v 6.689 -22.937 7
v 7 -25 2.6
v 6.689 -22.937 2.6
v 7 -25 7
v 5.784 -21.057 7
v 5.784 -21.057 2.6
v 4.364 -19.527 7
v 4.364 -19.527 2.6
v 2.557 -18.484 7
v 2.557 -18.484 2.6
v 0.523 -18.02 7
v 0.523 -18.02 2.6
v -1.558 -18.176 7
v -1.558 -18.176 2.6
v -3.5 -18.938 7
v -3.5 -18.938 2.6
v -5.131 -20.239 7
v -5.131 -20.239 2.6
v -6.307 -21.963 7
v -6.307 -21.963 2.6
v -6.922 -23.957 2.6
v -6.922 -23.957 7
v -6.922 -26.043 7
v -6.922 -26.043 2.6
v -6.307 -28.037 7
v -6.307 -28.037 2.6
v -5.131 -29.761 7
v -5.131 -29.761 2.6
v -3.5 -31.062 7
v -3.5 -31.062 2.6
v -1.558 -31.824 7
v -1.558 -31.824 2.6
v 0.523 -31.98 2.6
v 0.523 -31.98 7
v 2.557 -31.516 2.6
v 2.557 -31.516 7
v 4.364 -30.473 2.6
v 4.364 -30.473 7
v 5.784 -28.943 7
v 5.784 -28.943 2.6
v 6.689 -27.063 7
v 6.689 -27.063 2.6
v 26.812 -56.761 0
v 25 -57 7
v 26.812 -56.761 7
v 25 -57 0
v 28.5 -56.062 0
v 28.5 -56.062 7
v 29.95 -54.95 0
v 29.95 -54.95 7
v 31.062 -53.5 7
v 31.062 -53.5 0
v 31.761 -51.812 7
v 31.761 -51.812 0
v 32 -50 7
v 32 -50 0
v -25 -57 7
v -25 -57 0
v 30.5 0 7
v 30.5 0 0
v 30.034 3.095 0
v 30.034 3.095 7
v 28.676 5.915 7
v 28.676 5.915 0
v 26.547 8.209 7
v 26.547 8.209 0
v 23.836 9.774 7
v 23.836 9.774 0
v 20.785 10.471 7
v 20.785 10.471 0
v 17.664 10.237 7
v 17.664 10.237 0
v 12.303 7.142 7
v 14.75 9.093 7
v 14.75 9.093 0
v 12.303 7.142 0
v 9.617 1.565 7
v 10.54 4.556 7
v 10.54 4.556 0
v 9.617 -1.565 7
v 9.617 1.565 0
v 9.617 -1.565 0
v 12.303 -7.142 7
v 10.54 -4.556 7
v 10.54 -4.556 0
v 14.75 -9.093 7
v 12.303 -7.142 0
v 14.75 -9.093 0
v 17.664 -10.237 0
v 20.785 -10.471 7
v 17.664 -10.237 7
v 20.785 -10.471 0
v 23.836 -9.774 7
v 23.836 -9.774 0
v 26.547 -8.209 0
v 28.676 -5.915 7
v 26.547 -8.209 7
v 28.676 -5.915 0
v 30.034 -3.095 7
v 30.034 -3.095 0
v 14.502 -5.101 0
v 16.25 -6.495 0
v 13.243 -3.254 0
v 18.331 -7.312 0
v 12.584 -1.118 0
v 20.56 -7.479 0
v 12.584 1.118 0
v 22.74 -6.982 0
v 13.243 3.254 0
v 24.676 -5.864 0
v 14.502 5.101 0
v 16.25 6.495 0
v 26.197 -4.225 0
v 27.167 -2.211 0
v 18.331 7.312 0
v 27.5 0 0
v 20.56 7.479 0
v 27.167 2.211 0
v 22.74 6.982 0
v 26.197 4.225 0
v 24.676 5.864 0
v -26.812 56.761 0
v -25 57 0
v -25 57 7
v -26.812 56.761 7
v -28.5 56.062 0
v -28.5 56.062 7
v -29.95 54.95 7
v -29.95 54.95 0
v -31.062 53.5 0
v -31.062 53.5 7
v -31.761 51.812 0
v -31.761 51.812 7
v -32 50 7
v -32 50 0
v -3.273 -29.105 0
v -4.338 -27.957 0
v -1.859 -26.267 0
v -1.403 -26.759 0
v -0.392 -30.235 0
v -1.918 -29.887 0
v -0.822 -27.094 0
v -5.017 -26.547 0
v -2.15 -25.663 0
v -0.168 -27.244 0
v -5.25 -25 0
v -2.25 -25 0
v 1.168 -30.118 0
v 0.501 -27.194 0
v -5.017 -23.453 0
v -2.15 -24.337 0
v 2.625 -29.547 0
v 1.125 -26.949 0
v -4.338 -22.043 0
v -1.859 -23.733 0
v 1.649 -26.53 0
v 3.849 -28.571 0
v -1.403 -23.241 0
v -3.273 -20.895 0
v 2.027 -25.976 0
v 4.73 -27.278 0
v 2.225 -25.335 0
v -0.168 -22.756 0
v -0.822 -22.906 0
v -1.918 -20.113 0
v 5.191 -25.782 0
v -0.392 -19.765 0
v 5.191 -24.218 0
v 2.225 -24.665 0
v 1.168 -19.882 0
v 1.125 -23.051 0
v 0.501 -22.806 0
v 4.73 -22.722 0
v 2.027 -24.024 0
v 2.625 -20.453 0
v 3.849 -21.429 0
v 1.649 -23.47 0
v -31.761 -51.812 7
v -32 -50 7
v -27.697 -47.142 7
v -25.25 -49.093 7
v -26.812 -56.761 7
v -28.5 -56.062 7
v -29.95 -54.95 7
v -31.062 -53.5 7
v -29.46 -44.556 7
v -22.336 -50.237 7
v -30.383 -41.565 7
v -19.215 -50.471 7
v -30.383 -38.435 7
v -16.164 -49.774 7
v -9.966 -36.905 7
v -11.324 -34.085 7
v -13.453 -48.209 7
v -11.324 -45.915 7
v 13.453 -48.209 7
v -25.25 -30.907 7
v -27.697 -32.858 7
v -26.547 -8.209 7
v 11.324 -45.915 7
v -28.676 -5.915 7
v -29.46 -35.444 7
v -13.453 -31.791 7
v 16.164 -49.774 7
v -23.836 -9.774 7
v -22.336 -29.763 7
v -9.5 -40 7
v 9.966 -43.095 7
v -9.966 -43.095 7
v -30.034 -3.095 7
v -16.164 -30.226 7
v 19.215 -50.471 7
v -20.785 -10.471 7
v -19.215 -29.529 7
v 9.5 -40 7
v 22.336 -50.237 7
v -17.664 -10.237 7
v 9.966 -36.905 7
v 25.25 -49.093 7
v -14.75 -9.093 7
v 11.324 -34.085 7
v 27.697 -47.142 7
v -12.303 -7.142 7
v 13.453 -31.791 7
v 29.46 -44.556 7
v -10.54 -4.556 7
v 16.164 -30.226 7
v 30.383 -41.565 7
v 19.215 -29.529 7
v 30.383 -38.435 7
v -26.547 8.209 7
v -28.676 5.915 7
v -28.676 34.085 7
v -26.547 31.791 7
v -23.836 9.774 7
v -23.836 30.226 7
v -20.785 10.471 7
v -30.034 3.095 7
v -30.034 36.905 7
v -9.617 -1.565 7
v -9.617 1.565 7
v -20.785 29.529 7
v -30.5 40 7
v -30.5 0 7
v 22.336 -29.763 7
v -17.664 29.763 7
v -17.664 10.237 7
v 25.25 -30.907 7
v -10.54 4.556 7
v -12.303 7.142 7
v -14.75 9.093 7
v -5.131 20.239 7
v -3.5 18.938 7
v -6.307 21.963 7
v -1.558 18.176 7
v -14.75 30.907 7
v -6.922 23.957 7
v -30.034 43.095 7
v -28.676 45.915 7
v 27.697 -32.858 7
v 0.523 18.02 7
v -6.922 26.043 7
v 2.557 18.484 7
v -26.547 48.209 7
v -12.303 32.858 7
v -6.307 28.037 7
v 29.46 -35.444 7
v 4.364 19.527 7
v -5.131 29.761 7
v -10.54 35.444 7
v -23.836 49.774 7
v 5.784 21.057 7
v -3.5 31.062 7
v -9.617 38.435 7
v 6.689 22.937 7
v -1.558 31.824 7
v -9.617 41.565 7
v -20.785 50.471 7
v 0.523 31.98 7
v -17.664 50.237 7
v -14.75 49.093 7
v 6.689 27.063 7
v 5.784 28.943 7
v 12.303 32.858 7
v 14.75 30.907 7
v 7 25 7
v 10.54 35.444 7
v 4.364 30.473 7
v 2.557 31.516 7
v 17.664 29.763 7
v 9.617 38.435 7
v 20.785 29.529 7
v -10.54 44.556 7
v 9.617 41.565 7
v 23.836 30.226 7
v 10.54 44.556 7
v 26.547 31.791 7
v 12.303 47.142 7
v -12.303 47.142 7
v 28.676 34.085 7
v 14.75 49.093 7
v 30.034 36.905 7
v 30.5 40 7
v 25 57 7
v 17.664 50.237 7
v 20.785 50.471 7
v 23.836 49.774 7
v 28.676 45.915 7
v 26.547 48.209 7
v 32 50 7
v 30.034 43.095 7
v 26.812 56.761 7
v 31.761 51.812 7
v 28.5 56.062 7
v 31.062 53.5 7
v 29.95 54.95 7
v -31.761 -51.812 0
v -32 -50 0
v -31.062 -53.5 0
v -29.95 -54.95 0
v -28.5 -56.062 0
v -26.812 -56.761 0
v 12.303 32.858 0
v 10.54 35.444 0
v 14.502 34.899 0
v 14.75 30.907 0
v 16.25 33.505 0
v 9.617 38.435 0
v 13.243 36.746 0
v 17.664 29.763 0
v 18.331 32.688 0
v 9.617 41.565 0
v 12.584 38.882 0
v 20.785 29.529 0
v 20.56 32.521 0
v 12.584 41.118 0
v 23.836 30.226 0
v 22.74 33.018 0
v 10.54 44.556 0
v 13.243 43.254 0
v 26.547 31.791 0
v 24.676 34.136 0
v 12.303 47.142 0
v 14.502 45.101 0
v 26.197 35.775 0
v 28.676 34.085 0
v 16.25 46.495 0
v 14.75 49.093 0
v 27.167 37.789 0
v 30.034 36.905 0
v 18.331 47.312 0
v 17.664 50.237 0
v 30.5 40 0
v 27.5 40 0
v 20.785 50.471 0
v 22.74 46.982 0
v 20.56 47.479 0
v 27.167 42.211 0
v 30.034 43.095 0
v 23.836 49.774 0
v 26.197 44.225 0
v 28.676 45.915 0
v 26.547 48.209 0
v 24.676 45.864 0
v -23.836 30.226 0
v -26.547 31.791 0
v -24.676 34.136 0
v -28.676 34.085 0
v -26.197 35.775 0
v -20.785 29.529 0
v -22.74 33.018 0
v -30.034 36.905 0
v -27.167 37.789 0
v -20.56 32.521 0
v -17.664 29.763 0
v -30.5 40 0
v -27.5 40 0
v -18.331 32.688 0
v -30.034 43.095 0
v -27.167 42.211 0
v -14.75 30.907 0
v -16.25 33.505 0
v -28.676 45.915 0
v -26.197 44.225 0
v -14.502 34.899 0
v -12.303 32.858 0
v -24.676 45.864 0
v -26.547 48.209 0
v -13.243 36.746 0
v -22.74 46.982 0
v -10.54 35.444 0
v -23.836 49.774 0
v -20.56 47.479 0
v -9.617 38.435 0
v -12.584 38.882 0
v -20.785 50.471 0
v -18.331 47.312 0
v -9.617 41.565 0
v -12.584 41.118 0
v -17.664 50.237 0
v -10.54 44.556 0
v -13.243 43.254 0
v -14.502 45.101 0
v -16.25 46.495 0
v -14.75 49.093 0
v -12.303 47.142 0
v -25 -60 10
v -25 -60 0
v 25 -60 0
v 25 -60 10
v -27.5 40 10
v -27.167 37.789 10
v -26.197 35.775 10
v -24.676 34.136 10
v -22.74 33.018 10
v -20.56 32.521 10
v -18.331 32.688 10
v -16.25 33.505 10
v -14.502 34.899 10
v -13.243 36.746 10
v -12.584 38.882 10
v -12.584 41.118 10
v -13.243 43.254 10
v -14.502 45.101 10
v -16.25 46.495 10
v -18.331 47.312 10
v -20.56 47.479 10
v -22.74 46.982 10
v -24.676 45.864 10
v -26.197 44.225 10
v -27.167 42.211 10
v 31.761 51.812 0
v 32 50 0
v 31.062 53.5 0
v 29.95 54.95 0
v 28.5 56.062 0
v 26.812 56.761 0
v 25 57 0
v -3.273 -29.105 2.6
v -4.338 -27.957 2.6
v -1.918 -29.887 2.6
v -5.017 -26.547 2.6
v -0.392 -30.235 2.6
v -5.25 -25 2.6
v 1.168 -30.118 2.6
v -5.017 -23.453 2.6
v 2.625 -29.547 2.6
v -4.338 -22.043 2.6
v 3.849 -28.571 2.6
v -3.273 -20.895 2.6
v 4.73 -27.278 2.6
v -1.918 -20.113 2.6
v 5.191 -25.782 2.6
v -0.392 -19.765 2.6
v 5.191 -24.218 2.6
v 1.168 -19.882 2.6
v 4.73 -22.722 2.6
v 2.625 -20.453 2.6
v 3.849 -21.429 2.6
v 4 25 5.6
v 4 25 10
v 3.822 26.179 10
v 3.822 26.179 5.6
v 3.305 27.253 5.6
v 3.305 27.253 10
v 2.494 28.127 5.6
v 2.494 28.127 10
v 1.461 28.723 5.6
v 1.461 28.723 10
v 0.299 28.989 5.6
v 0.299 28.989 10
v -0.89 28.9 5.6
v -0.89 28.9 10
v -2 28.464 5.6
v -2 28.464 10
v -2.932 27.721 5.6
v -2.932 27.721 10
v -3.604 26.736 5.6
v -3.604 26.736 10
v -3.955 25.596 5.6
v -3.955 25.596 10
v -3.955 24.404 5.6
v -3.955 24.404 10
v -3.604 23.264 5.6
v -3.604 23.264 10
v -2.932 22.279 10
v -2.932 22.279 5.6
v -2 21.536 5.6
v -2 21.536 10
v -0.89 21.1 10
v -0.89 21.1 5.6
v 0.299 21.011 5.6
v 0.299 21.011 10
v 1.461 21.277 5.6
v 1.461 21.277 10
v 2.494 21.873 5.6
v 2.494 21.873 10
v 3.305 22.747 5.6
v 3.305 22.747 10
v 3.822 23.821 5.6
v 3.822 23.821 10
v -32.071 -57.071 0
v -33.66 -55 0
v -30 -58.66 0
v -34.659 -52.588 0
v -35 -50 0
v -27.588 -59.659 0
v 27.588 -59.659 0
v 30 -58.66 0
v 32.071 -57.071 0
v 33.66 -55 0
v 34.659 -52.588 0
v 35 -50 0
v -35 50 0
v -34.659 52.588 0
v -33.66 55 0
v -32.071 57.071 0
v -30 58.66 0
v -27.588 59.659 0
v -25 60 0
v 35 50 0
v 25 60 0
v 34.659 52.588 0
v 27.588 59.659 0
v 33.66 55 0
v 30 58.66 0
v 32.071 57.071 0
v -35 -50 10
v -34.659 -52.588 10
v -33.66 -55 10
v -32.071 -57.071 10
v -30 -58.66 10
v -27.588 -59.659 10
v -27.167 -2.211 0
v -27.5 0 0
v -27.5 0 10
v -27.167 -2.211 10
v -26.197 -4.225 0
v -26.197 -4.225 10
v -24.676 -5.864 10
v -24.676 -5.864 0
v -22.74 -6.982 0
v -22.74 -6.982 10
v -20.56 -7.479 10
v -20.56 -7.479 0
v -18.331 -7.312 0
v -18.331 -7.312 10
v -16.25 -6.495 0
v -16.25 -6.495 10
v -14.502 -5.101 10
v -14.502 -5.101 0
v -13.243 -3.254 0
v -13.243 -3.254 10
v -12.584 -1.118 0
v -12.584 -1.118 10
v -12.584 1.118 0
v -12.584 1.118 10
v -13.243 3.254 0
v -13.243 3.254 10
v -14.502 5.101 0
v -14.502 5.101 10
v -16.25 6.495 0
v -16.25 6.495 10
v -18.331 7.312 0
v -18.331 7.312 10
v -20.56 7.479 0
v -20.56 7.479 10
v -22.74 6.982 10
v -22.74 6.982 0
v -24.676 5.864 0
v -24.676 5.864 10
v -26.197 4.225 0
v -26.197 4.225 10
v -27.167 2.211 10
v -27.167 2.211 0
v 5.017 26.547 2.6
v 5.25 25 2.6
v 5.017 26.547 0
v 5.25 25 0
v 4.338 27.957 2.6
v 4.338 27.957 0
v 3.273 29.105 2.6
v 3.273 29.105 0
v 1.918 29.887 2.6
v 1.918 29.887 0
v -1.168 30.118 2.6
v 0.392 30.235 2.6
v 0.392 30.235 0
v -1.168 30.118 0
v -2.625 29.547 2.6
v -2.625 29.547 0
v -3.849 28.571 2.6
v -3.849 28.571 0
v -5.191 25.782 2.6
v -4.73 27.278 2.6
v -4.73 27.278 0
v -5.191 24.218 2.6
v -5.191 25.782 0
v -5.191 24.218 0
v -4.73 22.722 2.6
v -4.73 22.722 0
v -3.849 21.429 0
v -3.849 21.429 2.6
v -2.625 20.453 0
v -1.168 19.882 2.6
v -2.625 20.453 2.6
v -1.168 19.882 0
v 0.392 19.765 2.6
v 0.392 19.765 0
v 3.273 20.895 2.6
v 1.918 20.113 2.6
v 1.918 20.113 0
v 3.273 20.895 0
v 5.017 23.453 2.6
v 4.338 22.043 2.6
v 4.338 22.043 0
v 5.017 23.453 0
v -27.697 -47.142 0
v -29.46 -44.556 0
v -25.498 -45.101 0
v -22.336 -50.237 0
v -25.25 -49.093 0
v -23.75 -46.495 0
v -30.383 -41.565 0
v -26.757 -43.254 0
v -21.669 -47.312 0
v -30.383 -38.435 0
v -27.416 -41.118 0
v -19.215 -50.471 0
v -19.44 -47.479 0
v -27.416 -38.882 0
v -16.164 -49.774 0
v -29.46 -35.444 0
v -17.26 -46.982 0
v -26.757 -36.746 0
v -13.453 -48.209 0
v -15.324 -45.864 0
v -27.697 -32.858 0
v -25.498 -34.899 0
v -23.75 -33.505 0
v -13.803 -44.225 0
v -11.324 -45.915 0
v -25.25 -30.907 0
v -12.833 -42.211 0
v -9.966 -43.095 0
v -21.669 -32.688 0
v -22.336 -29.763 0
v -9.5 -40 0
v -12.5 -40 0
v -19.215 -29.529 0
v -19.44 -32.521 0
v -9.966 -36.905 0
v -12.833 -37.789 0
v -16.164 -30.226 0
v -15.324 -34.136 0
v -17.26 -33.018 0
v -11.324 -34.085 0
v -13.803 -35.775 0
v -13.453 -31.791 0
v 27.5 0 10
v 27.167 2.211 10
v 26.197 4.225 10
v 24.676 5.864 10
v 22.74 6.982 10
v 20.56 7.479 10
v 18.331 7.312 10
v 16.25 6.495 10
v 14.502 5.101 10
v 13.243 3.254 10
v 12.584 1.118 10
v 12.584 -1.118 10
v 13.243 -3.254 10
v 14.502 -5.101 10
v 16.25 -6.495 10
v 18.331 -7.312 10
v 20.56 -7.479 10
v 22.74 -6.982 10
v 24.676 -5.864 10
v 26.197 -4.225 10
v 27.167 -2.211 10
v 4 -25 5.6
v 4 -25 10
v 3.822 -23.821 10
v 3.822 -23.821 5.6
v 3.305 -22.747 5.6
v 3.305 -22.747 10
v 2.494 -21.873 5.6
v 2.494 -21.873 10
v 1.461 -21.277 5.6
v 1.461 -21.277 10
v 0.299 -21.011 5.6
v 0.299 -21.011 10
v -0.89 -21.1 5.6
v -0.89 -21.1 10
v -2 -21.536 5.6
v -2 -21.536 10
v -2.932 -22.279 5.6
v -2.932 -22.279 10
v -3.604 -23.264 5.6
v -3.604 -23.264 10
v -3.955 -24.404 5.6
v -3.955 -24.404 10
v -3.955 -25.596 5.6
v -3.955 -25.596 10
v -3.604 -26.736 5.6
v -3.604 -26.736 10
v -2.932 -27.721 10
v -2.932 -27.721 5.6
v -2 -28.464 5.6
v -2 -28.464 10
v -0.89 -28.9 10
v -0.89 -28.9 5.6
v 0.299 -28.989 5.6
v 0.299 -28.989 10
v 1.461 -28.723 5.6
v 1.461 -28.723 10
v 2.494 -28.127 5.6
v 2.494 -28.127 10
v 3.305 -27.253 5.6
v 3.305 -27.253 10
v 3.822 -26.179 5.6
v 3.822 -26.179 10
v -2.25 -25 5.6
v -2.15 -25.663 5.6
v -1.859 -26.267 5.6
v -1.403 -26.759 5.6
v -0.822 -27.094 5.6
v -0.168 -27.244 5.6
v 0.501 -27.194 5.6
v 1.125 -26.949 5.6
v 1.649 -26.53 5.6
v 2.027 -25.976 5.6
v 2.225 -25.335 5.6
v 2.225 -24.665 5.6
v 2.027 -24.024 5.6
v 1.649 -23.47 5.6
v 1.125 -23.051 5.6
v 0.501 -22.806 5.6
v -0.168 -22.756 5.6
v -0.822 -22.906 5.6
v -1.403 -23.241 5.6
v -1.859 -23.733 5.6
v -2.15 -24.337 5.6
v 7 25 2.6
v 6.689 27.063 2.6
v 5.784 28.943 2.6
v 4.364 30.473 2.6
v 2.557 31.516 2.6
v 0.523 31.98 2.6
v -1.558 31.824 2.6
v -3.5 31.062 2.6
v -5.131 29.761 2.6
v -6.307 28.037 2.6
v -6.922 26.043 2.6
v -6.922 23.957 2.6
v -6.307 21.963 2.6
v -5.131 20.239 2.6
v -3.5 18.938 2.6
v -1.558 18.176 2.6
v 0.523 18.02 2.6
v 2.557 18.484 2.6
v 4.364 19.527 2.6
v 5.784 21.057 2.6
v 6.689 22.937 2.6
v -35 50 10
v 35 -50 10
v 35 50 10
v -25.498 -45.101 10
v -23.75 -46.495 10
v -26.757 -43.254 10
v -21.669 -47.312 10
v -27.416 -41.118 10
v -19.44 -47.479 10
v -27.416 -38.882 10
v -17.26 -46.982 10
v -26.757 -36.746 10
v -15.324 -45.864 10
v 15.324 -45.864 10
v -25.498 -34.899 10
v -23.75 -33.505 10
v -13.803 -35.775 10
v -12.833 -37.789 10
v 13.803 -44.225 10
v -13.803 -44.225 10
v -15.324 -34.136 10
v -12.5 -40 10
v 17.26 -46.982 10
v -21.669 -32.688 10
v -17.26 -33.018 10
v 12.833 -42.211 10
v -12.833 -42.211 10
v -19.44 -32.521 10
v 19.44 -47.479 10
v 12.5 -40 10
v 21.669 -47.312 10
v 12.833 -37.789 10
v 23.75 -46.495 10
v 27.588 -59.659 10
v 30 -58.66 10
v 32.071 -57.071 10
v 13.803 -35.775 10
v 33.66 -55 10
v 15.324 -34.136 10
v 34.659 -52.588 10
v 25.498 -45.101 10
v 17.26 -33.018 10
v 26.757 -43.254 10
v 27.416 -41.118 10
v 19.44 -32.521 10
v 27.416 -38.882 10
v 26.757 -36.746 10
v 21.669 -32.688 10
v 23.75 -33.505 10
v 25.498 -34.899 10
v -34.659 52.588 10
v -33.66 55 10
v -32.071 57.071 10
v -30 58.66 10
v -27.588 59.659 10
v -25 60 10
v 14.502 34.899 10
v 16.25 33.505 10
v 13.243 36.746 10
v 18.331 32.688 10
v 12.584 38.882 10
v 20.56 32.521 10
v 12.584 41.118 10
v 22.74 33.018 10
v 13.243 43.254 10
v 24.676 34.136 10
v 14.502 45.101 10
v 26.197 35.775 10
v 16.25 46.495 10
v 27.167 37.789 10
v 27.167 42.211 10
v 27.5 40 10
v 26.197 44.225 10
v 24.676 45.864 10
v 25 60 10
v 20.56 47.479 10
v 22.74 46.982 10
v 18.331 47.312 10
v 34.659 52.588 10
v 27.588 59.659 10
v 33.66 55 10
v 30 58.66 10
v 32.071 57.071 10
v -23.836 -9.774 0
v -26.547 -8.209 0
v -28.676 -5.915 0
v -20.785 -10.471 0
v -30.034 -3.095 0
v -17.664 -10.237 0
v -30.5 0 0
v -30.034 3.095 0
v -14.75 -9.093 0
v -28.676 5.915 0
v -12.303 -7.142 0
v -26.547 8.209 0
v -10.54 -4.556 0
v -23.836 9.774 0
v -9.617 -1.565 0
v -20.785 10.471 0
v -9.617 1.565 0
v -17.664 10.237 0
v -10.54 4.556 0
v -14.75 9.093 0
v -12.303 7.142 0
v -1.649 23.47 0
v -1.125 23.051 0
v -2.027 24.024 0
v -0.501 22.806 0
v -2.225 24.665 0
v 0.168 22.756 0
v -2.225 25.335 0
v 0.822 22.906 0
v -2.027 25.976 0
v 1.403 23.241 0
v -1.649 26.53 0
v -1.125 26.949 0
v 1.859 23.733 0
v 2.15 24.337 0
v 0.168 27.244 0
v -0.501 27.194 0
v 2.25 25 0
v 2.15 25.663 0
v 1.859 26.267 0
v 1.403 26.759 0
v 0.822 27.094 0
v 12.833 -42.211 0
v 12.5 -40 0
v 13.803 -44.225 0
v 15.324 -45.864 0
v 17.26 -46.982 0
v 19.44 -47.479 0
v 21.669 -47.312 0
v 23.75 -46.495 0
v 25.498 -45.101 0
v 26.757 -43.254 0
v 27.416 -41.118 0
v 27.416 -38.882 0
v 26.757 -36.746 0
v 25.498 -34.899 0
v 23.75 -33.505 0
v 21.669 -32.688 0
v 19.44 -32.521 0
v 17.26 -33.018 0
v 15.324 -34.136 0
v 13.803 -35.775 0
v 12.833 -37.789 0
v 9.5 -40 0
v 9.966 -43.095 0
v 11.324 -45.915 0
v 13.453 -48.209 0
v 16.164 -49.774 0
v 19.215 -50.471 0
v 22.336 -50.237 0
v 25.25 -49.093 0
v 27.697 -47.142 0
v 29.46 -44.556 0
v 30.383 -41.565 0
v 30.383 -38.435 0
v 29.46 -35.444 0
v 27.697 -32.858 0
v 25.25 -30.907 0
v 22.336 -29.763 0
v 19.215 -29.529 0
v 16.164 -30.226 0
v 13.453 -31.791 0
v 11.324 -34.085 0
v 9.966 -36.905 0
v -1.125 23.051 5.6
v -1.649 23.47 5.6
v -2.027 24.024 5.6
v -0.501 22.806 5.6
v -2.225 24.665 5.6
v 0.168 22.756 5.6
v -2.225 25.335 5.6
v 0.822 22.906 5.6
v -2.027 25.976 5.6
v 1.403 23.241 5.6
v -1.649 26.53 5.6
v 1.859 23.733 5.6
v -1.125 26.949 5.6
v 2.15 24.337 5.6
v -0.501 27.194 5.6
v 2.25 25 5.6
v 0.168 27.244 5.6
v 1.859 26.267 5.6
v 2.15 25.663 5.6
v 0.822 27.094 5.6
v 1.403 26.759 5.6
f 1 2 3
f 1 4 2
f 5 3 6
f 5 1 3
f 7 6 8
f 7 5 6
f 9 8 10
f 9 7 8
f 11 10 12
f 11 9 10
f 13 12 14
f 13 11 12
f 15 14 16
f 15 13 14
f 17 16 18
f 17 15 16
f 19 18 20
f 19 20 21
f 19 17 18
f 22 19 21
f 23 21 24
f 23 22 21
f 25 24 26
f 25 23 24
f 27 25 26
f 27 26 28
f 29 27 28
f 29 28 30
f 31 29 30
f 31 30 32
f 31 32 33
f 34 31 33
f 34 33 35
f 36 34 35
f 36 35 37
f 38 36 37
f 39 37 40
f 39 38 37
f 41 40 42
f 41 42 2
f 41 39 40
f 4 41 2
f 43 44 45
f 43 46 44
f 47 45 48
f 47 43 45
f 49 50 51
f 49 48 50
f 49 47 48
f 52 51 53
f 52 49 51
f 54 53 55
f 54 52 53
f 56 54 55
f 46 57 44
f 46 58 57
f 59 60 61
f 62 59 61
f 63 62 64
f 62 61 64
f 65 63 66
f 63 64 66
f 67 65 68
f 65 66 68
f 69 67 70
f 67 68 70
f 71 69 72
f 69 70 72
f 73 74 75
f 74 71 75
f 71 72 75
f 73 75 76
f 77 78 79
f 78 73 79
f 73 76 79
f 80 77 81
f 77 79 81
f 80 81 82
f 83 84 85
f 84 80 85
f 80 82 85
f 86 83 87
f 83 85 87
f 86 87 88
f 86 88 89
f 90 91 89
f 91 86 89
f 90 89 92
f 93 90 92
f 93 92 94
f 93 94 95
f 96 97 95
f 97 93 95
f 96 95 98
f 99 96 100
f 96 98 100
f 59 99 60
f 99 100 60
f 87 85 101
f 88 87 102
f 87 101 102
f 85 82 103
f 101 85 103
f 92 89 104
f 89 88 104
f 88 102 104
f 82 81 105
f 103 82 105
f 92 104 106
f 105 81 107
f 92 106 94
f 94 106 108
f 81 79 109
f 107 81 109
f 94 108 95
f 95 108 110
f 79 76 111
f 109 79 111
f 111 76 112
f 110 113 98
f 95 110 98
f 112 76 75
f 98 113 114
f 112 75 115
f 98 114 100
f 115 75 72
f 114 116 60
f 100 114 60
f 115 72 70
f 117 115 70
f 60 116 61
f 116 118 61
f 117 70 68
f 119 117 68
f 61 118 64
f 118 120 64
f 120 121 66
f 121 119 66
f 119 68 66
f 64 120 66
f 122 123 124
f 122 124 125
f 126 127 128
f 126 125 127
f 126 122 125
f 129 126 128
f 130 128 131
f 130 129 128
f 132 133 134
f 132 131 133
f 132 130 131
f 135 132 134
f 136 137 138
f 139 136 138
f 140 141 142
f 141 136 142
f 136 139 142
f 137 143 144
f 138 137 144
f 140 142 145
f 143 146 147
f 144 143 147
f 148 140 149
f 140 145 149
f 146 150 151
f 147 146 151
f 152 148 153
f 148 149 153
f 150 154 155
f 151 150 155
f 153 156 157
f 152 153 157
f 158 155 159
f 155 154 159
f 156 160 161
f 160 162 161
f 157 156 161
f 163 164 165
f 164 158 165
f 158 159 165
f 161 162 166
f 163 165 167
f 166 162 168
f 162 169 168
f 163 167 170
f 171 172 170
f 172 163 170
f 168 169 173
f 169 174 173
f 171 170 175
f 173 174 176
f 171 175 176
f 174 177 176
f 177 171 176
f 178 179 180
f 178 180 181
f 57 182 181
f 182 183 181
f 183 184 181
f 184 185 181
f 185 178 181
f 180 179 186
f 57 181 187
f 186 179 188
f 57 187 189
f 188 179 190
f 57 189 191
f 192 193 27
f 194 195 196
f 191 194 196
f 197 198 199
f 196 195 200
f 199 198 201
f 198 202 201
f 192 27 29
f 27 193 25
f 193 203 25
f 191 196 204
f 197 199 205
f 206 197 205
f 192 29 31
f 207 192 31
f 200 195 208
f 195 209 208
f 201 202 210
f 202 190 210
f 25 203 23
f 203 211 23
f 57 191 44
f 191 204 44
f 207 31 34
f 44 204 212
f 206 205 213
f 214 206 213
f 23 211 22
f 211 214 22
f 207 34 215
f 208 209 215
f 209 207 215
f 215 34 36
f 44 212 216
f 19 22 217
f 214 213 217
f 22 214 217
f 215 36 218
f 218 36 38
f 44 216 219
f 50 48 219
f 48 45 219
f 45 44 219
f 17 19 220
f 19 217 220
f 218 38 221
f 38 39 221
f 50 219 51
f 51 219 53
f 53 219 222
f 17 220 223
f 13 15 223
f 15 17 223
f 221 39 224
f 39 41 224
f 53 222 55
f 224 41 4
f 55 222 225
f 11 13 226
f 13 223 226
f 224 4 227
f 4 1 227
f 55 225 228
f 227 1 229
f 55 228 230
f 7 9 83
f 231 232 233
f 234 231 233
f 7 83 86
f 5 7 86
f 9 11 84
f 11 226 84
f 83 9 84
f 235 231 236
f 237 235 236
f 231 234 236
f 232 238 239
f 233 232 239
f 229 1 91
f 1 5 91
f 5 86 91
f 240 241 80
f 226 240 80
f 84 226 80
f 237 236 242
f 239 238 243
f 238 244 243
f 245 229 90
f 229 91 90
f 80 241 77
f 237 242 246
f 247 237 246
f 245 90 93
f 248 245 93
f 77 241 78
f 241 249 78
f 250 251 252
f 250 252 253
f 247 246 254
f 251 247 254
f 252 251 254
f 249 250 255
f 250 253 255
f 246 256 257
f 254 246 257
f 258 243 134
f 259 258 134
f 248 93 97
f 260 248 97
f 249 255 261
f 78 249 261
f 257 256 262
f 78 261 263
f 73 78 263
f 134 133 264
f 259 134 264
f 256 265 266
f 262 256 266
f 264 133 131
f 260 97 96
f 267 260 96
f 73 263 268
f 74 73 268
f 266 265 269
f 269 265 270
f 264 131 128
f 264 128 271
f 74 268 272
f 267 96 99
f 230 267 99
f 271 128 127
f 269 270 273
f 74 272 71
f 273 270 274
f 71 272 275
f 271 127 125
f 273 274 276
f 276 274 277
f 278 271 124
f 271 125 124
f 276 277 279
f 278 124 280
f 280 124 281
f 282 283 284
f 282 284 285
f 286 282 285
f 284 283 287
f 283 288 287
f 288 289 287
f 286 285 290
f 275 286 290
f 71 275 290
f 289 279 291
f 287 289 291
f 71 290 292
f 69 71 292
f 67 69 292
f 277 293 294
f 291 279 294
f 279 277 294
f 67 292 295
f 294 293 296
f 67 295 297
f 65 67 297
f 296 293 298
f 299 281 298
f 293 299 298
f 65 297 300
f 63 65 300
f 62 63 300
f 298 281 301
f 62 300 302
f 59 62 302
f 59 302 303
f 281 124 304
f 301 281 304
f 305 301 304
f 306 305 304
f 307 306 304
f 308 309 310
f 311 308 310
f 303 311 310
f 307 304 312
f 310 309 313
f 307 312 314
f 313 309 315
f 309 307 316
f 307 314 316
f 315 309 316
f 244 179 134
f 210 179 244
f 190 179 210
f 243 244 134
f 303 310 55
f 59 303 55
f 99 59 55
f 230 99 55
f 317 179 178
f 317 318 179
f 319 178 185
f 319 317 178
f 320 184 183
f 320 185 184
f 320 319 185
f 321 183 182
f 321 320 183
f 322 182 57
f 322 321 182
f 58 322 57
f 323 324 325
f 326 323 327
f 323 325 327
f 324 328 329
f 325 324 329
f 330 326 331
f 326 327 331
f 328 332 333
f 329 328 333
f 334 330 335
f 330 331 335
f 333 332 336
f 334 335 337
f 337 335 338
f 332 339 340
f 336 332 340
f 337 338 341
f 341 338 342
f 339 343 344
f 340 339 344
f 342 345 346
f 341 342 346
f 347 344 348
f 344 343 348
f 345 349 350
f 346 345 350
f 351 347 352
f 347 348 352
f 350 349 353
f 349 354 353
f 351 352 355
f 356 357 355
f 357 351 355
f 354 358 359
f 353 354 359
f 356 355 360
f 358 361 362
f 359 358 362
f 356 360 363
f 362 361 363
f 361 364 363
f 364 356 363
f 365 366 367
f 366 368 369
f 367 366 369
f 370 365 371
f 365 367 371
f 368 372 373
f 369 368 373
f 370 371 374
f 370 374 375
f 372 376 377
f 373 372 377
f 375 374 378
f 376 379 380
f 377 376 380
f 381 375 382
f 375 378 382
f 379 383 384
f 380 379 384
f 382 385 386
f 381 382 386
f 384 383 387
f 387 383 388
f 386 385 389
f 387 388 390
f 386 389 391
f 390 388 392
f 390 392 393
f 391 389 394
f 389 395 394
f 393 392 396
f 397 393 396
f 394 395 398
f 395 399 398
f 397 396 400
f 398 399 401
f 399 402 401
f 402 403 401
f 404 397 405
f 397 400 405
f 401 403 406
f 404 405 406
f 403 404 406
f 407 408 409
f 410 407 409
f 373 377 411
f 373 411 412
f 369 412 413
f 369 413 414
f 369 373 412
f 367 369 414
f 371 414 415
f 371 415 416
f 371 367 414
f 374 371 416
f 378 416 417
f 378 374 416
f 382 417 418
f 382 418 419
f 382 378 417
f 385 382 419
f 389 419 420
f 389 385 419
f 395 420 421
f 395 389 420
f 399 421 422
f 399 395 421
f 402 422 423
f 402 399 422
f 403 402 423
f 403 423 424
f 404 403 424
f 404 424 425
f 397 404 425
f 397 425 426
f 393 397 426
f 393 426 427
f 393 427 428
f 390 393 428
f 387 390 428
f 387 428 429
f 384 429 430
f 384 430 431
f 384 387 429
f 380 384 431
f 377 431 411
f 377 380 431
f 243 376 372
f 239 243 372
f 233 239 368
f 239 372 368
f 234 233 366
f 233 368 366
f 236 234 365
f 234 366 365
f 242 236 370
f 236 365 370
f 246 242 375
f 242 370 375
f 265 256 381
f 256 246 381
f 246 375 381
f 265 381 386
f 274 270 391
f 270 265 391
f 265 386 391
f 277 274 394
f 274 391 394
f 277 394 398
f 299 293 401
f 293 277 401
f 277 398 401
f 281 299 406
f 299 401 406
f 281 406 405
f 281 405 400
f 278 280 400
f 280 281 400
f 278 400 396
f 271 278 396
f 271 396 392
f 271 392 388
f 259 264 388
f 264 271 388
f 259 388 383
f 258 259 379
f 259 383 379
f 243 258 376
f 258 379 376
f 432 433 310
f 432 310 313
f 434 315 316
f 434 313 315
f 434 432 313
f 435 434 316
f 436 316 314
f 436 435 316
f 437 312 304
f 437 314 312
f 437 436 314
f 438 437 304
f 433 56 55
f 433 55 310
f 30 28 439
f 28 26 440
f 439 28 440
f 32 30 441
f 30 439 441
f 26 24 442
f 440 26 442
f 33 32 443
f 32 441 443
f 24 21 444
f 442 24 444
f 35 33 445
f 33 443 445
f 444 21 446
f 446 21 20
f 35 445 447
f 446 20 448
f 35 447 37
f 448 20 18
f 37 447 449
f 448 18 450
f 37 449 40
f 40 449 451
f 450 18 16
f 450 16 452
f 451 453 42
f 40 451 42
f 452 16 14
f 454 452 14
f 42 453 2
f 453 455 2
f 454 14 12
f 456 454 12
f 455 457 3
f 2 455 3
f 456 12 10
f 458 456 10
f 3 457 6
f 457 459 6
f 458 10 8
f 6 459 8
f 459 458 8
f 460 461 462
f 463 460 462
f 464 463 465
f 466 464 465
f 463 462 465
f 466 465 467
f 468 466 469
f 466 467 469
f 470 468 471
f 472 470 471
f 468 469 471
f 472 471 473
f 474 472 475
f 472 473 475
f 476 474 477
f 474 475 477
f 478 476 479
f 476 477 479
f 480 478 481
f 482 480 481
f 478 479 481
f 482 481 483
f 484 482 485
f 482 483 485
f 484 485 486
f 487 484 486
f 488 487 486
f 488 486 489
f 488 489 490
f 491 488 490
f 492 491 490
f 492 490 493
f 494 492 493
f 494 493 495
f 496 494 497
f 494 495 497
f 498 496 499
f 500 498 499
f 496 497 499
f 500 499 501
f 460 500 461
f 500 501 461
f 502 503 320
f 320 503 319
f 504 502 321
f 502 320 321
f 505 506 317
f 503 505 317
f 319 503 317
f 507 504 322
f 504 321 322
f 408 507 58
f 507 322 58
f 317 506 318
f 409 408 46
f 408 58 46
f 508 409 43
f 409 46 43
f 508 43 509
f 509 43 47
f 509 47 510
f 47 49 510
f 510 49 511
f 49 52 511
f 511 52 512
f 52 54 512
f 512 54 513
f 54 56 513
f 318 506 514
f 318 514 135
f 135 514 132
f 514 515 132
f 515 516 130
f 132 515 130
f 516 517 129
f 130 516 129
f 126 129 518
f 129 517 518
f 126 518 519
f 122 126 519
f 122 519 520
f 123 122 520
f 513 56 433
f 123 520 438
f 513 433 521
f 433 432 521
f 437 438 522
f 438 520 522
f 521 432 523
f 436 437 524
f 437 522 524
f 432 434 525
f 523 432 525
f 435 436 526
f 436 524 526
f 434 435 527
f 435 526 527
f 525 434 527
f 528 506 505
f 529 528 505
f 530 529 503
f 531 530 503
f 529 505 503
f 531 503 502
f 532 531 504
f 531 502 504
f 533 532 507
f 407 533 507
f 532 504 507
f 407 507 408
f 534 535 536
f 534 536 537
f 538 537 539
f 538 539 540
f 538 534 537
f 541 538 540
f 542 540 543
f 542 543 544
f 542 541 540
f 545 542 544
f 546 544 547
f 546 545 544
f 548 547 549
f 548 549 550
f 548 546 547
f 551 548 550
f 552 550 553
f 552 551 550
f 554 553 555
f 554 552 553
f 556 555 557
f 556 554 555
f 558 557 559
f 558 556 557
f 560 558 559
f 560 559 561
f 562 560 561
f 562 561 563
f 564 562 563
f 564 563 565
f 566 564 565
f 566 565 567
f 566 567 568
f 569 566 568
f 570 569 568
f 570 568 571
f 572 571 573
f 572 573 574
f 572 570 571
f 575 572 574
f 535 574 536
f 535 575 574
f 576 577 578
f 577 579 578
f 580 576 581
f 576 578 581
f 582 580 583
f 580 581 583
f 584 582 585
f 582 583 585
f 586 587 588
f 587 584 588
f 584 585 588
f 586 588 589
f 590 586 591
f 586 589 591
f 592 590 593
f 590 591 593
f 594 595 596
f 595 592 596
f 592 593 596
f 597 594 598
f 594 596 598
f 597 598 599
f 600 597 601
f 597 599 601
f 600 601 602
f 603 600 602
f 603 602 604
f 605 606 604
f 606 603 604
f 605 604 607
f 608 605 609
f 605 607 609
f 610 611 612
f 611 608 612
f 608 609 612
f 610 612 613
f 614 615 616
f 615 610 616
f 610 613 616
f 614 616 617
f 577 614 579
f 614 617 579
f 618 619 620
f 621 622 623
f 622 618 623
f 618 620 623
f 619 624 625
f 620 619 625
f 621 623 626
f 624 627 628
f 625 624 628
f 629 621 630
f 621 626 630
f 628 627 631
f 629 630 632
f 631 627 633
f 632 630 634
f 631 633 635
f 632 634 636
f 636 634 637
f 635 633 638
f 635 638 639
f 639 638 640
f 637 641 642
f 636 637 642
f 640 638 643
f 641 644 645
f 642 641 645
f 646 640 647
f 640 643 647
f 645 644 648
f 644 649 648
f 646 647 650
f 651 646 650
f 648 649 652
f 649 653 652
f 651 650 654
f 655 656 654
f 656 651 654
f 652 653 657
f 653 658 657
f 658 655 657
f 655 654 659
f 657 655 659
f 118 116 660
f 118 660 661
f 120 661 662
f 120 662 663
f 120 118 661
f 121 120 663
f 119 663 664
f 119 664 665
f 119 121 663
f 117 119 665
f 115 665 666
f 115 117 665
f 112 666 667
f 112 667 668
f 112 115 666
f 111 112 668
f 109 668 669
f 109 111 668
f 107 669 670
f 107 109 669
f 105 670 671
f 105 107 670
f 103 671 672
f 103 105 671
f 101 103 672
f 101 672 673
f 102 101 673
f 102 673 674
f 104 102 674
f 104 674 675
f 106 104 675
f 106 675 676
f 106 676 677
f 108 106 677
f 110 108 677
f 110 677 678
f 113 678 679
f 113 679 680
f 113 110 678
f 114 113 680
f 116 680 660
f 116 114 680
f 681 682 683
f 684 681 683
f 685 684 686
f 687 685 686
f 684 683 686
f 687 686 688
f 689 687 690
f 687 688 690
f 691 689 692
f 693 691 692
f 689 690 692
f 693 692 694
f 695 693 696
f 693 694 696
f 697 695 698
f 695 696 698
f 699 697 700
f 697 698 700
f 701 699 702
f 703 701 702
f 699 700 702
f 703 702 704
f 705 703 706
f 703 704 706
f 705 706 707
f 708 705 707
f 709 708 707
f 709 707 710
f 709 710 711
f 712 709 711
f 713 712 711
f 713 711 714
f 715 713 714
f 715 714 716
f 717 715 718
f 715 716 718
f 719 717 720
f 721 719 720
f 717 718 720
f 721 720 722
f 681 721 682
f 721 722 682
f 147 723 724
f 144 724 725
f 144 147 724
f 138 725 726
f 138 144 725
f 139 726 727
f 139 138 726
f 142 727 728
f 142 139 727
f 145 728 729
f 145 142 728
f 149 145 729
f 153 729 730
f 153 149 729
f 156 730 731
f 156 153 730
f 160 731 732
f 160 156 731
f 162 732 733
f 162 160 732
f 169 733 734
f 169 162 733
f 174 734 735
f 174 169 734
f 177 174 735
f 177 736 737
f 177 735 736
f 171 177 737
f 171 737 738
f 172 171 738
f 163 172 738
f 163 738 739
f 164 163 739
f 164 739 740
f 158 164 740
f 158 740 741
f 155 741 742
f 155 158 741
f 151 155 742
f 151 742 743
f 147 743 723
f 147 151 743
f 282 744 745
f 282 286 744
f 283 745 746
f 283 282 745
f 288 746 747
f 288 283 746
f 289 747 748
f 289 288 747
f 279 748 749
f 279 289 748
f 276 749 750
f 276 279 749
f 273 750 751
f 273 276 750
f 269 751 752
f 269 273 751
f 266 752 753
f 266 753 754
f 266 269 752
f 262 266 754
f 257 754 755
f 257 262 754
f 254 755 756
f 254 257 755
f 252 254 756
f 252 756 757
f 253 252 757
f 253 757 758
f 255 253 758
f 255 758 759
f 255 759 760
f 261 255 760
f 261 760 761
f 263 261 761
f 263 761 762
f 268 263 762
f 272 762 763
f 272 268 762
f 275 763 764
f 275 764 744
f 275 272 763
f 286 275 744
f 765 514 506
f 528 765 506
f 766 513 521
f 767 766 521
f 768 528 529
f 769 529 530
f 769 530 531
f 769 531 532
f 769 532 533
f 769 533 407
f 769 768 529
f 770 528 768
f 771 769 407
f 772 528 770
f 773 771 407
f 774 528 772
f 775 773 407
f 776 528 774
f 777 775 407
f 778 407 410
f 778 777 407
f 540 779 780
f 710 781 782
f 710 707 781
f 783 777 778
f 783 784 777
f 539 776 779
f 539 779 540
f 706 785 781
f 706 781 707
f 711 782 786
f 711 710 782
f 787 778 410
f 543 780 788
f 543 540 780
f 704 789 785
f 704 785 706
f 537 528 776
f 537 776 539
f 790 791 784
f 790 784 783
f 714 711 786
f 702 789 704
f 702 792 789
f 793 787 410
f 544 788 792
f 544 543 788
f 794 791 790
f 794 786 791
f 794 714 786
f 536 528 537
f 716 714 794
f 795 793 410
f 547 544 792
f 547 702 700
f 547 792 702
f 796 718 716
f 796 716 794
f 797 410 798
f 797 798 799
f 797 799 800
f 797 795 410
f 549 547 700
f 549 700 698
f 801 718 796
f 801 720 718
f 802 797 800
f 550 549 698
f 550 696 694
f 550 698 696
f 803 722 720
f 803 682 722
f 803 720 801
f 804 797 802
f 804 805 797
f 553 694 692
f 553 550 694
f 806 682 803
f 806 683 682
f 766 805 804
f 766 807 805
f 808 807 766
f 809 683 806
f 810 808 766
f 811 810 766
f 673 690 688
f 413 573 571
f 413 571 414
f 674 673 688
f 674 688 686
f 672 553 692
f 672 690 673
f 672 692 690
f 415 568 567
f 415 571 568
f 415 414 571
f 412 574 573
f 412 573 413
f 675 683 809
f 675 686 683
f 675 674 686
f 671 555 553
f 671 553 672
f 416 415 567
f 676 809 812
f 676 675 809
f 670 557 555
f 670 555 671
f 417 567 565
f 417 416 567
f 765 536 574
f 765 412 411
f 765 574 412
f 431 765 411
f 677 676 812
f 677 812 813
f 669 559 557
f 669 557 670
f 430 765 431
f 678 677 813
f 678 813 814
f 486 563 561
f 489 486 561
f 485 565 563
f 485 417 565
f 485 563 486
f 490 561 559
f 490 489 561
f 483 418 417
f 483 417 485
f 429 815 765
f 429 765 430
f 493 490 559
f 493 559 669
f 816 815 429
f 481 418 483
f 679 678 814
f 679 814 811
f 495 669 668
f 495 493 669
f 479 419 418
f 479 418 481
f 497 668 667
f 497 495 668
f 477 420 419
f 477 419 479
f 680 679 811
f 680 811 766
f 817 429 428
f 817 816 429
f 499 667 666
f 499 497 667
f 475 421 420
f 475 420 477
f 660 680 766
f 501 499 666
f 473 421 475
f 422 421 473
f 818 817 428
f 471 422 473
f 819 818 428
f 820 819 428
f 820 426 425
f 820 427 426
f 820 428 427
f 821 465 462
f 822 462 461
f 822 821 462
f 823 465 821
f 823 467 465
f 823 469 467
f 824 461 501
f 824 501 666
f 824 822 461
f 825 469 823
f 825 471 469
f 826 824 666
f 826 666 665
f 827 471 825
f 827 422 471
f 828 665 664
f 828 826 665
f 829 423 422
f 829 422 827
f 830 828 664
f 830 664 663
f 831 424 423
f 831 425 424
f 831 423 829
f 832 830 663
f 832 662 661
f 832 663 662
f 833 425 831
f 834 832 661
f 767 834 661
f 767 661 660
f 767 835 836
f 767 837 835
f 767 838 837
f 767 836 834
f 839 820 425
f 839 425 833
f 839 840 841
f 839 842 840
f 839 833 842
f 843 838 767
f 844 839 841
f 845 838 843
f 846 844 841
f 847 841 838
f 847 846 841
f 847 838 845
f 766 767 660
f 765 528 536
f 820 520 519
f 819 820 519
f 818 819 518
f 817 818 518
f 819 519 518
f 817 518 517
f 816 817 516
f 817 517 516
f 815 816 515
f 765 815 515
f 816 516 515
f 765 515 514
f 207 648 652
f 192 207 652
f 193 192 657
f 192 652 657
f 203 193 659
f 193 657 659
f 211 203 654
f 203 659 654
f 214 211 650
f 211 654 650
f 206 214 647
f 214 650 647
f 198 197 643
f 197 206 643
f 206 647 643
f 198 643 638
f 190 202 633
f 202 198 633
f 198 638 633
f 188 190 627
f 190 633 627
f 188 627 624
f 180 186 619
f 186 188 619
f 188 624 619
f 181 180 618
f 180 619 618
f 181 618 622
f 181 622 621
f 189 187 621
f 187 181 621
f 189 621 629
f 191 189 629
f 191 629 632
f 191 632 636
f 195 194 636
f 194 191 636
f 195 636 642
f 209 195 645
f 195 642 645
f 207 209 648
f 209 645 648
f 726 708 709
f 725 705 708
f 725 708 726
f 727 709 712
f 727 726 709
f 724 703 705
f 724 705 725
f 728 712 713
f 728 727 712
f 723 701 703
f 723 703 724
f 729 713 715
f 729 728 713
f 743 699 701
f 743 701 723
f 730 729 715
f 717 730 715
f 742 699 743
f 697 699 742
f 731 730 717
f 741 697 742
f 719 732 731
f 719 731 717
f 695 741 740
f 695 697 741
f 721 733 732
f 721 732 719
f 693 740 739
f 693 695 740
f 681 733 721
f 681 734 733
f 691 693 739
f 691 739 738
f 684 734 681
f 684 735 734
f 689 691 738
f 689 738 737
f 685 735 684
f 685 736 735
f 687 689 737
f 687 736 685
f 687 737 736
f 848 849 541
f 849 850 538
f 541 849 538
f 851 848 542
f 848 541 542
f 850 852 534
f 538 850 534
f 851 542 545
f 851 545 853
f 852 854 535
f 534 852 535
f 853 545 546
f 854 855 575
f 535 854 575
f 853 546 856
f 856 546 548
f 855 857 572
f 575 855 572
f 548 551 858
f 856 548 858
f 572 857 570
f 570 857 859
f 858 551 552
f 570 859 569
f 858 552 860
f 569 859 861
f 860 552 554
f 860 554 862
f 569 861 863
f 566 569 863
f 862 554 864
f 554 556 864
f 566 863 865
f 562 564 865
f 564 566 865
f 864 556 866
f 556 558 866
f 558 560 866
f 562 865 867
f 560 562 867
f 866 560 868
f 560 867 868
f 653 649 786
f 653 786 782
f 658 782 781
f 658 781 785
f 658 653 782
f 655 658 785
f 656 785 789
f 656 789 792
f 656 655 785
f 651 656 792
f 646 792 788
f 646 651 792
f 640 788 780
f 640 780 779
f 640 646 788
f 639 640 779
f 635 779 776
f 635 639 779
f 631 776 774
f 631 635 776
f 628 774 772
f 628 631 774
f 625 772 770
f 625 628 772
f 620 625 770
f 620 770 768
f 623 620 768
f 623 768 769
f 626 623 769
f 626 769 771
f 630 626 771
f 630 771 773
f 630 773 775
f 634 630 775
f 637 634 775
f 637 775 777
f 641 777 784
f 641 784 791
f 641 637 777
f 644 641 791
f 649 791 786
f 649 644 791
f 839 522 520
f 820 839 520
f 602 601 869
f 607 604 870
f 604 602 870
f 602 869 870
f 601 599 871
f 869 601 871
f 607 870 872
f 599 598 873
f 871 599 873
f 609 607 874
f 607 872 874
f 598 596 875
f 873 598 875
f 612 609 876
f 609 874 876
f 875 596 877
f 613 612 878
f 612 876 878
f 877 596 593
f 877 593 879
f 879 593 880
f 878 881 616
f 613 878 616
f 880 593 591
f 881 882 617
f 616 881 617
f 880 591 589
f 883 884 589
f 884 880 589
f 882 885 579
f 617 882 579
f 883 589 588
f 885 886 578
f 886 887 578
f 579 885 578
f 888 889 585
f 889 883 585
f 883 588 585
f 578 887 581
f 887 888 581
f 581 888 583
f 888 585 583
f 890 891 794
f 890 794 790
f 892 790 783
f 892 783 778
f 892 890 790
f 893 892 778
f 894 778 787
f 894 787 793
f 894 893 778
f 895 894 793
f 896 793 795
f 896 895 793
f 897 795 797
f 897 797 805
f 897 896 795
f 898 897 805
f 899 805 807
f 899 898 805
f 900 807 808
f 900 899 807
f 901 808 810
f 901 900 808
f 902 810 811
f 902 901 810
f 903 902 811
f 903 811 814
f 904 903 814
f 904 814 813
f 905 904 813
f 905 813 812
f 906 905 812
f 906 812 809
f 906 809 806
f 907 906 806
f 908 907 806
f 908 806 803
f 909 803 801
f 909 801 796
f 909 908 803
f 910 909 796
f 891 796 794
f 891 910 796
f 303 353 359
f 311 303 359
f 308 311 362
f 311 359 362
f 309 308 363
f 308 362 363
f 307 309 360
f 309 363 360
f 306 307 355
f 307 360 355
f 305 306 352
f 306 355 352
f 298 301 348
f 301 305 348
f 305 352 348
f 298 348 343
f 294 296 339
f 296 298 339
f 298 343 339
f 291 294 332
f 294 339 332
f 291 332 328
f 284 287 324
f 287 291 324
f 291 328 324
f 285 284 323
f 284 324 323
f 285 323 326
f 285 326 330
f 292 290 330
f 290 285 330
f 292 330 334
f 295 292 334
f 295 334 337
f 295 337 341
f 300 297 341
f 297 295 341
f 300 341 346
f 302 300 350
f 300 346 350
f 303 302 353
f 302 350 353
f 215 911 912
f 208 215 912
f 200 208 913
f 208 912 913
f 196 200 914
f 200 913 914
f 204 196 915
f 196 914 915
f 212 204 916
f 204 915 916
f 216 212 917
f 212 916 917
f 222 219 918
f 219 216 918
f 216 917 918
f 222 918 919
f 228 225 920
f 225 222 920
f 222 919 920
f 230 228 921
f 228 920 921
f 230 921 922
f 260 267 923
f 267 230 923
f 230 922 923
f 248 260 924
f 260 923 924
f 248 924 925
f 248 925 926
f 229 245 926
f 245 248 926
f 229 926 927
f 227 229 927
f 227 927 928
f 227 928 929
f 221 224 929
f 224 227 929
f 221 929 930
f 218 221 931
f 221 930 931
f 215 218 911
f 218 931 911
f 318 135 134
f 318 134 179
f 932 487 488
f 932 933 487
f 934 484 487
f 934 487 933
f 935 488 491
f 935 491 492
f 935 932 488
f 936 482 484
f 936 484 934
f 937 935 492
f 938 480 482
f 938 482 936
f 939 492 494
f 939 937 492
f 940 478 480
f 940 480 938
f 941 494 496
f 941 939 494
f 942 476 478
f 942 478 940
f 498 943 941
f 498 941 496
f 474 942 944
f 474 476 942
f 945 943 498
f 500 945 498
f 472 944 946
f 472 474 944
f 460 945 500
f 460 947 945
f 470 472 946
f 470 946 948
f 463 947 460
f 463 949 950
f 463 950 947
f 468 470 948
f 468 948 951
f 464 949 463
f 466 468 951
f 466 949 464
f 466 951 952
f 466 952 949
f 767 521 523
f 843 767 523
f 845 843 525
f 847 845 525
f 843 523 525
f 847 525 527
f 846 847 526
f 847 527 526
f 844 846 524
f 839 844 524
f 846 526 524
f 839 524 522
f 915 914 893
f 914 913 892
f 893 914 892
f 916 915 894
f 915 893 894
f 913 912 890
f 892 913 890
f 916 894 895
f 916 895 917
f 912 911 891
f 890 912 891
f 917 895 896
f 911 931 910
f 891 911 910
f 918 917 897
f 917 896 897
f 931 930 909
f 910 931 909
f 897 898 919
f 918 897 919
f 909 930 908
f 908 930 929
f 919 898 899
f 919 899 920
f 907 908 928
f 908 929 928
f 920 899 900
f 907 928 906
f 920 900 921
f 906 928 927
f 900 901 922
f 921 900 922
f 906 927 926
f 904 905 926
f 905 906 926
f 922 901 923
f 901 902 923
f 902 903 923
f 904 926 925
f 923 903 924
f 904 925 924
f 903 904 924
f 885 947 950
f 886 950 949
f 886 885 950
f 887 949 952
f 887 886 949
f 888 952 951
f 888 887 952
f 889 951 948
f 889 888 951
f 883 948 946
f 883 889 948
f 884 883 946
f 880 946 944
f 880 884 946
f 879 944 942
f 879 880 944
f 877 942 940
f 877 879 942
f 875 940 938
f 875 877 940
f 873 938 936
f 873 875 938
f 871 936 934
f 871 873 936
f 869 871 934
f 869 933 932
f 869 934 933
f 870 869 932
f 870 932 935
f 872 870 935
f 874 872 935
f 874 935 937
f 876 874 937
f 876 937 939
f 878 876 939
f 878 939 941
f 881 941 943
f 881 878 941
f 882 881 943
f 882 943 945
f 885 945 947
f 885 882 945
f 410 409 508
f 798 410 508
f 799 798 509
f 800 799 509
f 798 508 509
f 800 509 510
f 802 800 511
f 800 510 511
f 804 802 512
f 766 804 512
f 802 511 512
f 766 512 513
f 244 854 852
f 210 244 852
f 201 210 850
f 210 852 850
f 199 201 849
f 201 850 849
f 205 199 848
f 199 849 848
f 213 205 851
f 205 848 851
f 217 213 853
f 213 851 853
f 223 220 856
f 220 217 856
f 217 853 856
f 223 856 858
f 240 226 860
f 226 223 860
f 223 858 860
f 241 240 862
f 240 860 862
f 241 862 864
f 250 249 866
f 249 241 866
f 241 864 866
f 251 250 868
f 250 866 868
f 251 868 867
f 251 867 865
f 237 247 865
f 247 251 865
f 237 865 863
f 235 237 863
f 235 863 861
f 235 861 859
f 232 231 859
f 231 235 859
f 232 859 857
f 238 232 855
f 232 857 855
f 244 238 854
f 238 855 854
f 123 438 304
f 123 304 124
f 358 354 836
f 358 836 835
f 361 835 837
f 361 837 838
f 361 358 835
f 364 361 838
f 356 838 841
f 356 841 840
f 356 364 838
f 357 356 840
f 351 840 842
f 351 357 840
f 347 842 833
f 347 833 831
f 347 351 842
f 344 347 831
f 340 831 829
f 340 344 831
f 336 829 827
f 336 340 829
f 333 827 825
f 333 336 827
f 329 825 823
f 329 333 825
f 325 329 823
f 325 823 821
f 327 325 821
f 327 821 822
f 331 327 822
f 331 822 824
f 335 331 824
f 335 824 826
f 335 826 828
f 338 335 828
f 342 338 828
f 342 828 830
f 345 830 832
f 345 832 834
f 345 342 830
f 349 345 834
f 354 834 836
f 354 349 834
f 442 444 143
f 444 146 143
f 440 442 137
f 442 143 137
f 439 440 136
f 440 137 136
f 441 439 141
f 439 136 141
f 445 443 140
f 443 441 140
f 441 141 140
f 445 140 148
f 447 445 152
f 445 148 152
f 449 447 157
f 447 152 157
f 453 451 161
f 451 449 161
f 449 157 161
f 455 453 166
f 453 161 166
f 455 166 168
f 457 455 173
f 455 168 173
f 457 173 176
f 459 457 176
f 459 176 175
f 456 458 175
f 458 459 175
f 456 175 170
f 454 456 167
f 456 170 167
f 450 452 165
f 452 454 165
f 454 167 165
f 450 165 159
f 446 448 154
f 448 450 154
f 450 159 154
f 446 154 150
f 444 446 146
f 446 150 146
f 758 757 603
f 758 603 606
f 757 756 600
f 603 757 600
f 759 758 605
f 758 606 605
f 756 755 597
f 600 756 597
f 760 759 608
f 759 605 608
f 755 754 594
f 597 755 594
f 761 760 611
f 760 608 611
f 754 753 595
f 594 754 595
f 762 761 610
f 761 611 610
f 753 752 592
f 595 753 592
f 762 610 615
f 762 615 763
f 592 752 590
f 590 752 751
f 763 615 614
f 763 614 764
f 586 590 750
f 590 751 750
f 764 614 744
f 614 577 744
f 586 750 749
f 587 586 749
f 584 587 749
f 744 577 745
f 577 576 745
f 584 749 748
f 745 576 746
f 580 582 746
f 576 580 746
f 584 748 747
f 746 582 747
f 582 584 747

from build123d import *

# Parameters (mm, degrees)
SKETCH_1_R          = 7.5
SKETCH_1_R_2        = 2.25
EXTRUDE_1_DEPTH     = 10
SKETCH_2_R          = 4
CUT_EXTRUDE_1_DEPTH = 4.4
SHELL_1_T           = -3


with BuildPart() as part:
    # 草图1 → 凸台-拉伸1 (new body)
    with BuildSketch(Plane.XY):
        with BuildLine():
            Line((-25, -60), (25, -60))
            ThreePointArc((25, -60), (32.071067812, -57.071067812), (35, -50))
            Line((35, -50), (35, 50))
            ThreePointArc((35, 50), (32.071067812, 57.071067812), (25, 60))
            Line((25, 60), (-25, 60))
            ThreePointArc((-25, 60), (-32.071067812, 57.071067812), (-35, 50))
            Line((-35, 50), (-35, -50))
            ThreePointArc((-35, -50), (-32.071067812, -57.071067812), (-25, -60))
        make_face()
        with Locations((20, 40)):
            Circle(SKETCH_1_R, mode=Mode.SUBTRACT)
        with Locations((20, 0)):
            Circle(SKETCH_1_R, mode=Mode.SUBTRACT)
        with Locations(Location((20, -40, 0), (0, 0, 180))):
            Circle(SKETCH_1_R, mode=Mode.SUBTRACT)
        with Locations((-20, -40)):
            Circle(SKETCH_1_R, mode=Mode.SUBTRACT)
        with Locations(Location((-20, 0, 0), (0, 0, 180))):
            Circle(SKETCH_1_R, mode=Mode.SUBTRACT)
        with Locations(Location((-20, 40, 0), (0, 0, 180))):
            Circle(SKETCH_1_R, mode=Mode.SUBTRACT)
        with Locations((0, 25)):
            Circle(SKETCH_1_R_2, mode=Mode.SUBTRACT)
        with Locations(Location((0, -25, 0), (0, 0, 180))):
            Circle(SKETCH_1_R_2, mode=Mode.SUBTRACT)
    extrude(amount=EXTRUDE_1_DEPTH)

    # 草图2 → 切除-拉伸1 (cut)
    with BuildSketch(Plane.XY.offset(10)):
        with Locations((0, 25)):
            Circle(SKETCH_2_R)
        with Locations((0, -25)):
            Circle(SKETCH_2_R)
    extrude(amount=-CUT_EXTRUDE_1_DEPTH, mode=Mode.SUBTRACT)

    # 抽壳1
    shell_1_openings = [part.faces().sort_by_distance(p)[0] for p in [
        (0, 0, 0),
    ]]
    offset(amount=SHELL_1_T, openings=shell_1_openings, kind=Kind.INTERSECTION)


solid = part.part
